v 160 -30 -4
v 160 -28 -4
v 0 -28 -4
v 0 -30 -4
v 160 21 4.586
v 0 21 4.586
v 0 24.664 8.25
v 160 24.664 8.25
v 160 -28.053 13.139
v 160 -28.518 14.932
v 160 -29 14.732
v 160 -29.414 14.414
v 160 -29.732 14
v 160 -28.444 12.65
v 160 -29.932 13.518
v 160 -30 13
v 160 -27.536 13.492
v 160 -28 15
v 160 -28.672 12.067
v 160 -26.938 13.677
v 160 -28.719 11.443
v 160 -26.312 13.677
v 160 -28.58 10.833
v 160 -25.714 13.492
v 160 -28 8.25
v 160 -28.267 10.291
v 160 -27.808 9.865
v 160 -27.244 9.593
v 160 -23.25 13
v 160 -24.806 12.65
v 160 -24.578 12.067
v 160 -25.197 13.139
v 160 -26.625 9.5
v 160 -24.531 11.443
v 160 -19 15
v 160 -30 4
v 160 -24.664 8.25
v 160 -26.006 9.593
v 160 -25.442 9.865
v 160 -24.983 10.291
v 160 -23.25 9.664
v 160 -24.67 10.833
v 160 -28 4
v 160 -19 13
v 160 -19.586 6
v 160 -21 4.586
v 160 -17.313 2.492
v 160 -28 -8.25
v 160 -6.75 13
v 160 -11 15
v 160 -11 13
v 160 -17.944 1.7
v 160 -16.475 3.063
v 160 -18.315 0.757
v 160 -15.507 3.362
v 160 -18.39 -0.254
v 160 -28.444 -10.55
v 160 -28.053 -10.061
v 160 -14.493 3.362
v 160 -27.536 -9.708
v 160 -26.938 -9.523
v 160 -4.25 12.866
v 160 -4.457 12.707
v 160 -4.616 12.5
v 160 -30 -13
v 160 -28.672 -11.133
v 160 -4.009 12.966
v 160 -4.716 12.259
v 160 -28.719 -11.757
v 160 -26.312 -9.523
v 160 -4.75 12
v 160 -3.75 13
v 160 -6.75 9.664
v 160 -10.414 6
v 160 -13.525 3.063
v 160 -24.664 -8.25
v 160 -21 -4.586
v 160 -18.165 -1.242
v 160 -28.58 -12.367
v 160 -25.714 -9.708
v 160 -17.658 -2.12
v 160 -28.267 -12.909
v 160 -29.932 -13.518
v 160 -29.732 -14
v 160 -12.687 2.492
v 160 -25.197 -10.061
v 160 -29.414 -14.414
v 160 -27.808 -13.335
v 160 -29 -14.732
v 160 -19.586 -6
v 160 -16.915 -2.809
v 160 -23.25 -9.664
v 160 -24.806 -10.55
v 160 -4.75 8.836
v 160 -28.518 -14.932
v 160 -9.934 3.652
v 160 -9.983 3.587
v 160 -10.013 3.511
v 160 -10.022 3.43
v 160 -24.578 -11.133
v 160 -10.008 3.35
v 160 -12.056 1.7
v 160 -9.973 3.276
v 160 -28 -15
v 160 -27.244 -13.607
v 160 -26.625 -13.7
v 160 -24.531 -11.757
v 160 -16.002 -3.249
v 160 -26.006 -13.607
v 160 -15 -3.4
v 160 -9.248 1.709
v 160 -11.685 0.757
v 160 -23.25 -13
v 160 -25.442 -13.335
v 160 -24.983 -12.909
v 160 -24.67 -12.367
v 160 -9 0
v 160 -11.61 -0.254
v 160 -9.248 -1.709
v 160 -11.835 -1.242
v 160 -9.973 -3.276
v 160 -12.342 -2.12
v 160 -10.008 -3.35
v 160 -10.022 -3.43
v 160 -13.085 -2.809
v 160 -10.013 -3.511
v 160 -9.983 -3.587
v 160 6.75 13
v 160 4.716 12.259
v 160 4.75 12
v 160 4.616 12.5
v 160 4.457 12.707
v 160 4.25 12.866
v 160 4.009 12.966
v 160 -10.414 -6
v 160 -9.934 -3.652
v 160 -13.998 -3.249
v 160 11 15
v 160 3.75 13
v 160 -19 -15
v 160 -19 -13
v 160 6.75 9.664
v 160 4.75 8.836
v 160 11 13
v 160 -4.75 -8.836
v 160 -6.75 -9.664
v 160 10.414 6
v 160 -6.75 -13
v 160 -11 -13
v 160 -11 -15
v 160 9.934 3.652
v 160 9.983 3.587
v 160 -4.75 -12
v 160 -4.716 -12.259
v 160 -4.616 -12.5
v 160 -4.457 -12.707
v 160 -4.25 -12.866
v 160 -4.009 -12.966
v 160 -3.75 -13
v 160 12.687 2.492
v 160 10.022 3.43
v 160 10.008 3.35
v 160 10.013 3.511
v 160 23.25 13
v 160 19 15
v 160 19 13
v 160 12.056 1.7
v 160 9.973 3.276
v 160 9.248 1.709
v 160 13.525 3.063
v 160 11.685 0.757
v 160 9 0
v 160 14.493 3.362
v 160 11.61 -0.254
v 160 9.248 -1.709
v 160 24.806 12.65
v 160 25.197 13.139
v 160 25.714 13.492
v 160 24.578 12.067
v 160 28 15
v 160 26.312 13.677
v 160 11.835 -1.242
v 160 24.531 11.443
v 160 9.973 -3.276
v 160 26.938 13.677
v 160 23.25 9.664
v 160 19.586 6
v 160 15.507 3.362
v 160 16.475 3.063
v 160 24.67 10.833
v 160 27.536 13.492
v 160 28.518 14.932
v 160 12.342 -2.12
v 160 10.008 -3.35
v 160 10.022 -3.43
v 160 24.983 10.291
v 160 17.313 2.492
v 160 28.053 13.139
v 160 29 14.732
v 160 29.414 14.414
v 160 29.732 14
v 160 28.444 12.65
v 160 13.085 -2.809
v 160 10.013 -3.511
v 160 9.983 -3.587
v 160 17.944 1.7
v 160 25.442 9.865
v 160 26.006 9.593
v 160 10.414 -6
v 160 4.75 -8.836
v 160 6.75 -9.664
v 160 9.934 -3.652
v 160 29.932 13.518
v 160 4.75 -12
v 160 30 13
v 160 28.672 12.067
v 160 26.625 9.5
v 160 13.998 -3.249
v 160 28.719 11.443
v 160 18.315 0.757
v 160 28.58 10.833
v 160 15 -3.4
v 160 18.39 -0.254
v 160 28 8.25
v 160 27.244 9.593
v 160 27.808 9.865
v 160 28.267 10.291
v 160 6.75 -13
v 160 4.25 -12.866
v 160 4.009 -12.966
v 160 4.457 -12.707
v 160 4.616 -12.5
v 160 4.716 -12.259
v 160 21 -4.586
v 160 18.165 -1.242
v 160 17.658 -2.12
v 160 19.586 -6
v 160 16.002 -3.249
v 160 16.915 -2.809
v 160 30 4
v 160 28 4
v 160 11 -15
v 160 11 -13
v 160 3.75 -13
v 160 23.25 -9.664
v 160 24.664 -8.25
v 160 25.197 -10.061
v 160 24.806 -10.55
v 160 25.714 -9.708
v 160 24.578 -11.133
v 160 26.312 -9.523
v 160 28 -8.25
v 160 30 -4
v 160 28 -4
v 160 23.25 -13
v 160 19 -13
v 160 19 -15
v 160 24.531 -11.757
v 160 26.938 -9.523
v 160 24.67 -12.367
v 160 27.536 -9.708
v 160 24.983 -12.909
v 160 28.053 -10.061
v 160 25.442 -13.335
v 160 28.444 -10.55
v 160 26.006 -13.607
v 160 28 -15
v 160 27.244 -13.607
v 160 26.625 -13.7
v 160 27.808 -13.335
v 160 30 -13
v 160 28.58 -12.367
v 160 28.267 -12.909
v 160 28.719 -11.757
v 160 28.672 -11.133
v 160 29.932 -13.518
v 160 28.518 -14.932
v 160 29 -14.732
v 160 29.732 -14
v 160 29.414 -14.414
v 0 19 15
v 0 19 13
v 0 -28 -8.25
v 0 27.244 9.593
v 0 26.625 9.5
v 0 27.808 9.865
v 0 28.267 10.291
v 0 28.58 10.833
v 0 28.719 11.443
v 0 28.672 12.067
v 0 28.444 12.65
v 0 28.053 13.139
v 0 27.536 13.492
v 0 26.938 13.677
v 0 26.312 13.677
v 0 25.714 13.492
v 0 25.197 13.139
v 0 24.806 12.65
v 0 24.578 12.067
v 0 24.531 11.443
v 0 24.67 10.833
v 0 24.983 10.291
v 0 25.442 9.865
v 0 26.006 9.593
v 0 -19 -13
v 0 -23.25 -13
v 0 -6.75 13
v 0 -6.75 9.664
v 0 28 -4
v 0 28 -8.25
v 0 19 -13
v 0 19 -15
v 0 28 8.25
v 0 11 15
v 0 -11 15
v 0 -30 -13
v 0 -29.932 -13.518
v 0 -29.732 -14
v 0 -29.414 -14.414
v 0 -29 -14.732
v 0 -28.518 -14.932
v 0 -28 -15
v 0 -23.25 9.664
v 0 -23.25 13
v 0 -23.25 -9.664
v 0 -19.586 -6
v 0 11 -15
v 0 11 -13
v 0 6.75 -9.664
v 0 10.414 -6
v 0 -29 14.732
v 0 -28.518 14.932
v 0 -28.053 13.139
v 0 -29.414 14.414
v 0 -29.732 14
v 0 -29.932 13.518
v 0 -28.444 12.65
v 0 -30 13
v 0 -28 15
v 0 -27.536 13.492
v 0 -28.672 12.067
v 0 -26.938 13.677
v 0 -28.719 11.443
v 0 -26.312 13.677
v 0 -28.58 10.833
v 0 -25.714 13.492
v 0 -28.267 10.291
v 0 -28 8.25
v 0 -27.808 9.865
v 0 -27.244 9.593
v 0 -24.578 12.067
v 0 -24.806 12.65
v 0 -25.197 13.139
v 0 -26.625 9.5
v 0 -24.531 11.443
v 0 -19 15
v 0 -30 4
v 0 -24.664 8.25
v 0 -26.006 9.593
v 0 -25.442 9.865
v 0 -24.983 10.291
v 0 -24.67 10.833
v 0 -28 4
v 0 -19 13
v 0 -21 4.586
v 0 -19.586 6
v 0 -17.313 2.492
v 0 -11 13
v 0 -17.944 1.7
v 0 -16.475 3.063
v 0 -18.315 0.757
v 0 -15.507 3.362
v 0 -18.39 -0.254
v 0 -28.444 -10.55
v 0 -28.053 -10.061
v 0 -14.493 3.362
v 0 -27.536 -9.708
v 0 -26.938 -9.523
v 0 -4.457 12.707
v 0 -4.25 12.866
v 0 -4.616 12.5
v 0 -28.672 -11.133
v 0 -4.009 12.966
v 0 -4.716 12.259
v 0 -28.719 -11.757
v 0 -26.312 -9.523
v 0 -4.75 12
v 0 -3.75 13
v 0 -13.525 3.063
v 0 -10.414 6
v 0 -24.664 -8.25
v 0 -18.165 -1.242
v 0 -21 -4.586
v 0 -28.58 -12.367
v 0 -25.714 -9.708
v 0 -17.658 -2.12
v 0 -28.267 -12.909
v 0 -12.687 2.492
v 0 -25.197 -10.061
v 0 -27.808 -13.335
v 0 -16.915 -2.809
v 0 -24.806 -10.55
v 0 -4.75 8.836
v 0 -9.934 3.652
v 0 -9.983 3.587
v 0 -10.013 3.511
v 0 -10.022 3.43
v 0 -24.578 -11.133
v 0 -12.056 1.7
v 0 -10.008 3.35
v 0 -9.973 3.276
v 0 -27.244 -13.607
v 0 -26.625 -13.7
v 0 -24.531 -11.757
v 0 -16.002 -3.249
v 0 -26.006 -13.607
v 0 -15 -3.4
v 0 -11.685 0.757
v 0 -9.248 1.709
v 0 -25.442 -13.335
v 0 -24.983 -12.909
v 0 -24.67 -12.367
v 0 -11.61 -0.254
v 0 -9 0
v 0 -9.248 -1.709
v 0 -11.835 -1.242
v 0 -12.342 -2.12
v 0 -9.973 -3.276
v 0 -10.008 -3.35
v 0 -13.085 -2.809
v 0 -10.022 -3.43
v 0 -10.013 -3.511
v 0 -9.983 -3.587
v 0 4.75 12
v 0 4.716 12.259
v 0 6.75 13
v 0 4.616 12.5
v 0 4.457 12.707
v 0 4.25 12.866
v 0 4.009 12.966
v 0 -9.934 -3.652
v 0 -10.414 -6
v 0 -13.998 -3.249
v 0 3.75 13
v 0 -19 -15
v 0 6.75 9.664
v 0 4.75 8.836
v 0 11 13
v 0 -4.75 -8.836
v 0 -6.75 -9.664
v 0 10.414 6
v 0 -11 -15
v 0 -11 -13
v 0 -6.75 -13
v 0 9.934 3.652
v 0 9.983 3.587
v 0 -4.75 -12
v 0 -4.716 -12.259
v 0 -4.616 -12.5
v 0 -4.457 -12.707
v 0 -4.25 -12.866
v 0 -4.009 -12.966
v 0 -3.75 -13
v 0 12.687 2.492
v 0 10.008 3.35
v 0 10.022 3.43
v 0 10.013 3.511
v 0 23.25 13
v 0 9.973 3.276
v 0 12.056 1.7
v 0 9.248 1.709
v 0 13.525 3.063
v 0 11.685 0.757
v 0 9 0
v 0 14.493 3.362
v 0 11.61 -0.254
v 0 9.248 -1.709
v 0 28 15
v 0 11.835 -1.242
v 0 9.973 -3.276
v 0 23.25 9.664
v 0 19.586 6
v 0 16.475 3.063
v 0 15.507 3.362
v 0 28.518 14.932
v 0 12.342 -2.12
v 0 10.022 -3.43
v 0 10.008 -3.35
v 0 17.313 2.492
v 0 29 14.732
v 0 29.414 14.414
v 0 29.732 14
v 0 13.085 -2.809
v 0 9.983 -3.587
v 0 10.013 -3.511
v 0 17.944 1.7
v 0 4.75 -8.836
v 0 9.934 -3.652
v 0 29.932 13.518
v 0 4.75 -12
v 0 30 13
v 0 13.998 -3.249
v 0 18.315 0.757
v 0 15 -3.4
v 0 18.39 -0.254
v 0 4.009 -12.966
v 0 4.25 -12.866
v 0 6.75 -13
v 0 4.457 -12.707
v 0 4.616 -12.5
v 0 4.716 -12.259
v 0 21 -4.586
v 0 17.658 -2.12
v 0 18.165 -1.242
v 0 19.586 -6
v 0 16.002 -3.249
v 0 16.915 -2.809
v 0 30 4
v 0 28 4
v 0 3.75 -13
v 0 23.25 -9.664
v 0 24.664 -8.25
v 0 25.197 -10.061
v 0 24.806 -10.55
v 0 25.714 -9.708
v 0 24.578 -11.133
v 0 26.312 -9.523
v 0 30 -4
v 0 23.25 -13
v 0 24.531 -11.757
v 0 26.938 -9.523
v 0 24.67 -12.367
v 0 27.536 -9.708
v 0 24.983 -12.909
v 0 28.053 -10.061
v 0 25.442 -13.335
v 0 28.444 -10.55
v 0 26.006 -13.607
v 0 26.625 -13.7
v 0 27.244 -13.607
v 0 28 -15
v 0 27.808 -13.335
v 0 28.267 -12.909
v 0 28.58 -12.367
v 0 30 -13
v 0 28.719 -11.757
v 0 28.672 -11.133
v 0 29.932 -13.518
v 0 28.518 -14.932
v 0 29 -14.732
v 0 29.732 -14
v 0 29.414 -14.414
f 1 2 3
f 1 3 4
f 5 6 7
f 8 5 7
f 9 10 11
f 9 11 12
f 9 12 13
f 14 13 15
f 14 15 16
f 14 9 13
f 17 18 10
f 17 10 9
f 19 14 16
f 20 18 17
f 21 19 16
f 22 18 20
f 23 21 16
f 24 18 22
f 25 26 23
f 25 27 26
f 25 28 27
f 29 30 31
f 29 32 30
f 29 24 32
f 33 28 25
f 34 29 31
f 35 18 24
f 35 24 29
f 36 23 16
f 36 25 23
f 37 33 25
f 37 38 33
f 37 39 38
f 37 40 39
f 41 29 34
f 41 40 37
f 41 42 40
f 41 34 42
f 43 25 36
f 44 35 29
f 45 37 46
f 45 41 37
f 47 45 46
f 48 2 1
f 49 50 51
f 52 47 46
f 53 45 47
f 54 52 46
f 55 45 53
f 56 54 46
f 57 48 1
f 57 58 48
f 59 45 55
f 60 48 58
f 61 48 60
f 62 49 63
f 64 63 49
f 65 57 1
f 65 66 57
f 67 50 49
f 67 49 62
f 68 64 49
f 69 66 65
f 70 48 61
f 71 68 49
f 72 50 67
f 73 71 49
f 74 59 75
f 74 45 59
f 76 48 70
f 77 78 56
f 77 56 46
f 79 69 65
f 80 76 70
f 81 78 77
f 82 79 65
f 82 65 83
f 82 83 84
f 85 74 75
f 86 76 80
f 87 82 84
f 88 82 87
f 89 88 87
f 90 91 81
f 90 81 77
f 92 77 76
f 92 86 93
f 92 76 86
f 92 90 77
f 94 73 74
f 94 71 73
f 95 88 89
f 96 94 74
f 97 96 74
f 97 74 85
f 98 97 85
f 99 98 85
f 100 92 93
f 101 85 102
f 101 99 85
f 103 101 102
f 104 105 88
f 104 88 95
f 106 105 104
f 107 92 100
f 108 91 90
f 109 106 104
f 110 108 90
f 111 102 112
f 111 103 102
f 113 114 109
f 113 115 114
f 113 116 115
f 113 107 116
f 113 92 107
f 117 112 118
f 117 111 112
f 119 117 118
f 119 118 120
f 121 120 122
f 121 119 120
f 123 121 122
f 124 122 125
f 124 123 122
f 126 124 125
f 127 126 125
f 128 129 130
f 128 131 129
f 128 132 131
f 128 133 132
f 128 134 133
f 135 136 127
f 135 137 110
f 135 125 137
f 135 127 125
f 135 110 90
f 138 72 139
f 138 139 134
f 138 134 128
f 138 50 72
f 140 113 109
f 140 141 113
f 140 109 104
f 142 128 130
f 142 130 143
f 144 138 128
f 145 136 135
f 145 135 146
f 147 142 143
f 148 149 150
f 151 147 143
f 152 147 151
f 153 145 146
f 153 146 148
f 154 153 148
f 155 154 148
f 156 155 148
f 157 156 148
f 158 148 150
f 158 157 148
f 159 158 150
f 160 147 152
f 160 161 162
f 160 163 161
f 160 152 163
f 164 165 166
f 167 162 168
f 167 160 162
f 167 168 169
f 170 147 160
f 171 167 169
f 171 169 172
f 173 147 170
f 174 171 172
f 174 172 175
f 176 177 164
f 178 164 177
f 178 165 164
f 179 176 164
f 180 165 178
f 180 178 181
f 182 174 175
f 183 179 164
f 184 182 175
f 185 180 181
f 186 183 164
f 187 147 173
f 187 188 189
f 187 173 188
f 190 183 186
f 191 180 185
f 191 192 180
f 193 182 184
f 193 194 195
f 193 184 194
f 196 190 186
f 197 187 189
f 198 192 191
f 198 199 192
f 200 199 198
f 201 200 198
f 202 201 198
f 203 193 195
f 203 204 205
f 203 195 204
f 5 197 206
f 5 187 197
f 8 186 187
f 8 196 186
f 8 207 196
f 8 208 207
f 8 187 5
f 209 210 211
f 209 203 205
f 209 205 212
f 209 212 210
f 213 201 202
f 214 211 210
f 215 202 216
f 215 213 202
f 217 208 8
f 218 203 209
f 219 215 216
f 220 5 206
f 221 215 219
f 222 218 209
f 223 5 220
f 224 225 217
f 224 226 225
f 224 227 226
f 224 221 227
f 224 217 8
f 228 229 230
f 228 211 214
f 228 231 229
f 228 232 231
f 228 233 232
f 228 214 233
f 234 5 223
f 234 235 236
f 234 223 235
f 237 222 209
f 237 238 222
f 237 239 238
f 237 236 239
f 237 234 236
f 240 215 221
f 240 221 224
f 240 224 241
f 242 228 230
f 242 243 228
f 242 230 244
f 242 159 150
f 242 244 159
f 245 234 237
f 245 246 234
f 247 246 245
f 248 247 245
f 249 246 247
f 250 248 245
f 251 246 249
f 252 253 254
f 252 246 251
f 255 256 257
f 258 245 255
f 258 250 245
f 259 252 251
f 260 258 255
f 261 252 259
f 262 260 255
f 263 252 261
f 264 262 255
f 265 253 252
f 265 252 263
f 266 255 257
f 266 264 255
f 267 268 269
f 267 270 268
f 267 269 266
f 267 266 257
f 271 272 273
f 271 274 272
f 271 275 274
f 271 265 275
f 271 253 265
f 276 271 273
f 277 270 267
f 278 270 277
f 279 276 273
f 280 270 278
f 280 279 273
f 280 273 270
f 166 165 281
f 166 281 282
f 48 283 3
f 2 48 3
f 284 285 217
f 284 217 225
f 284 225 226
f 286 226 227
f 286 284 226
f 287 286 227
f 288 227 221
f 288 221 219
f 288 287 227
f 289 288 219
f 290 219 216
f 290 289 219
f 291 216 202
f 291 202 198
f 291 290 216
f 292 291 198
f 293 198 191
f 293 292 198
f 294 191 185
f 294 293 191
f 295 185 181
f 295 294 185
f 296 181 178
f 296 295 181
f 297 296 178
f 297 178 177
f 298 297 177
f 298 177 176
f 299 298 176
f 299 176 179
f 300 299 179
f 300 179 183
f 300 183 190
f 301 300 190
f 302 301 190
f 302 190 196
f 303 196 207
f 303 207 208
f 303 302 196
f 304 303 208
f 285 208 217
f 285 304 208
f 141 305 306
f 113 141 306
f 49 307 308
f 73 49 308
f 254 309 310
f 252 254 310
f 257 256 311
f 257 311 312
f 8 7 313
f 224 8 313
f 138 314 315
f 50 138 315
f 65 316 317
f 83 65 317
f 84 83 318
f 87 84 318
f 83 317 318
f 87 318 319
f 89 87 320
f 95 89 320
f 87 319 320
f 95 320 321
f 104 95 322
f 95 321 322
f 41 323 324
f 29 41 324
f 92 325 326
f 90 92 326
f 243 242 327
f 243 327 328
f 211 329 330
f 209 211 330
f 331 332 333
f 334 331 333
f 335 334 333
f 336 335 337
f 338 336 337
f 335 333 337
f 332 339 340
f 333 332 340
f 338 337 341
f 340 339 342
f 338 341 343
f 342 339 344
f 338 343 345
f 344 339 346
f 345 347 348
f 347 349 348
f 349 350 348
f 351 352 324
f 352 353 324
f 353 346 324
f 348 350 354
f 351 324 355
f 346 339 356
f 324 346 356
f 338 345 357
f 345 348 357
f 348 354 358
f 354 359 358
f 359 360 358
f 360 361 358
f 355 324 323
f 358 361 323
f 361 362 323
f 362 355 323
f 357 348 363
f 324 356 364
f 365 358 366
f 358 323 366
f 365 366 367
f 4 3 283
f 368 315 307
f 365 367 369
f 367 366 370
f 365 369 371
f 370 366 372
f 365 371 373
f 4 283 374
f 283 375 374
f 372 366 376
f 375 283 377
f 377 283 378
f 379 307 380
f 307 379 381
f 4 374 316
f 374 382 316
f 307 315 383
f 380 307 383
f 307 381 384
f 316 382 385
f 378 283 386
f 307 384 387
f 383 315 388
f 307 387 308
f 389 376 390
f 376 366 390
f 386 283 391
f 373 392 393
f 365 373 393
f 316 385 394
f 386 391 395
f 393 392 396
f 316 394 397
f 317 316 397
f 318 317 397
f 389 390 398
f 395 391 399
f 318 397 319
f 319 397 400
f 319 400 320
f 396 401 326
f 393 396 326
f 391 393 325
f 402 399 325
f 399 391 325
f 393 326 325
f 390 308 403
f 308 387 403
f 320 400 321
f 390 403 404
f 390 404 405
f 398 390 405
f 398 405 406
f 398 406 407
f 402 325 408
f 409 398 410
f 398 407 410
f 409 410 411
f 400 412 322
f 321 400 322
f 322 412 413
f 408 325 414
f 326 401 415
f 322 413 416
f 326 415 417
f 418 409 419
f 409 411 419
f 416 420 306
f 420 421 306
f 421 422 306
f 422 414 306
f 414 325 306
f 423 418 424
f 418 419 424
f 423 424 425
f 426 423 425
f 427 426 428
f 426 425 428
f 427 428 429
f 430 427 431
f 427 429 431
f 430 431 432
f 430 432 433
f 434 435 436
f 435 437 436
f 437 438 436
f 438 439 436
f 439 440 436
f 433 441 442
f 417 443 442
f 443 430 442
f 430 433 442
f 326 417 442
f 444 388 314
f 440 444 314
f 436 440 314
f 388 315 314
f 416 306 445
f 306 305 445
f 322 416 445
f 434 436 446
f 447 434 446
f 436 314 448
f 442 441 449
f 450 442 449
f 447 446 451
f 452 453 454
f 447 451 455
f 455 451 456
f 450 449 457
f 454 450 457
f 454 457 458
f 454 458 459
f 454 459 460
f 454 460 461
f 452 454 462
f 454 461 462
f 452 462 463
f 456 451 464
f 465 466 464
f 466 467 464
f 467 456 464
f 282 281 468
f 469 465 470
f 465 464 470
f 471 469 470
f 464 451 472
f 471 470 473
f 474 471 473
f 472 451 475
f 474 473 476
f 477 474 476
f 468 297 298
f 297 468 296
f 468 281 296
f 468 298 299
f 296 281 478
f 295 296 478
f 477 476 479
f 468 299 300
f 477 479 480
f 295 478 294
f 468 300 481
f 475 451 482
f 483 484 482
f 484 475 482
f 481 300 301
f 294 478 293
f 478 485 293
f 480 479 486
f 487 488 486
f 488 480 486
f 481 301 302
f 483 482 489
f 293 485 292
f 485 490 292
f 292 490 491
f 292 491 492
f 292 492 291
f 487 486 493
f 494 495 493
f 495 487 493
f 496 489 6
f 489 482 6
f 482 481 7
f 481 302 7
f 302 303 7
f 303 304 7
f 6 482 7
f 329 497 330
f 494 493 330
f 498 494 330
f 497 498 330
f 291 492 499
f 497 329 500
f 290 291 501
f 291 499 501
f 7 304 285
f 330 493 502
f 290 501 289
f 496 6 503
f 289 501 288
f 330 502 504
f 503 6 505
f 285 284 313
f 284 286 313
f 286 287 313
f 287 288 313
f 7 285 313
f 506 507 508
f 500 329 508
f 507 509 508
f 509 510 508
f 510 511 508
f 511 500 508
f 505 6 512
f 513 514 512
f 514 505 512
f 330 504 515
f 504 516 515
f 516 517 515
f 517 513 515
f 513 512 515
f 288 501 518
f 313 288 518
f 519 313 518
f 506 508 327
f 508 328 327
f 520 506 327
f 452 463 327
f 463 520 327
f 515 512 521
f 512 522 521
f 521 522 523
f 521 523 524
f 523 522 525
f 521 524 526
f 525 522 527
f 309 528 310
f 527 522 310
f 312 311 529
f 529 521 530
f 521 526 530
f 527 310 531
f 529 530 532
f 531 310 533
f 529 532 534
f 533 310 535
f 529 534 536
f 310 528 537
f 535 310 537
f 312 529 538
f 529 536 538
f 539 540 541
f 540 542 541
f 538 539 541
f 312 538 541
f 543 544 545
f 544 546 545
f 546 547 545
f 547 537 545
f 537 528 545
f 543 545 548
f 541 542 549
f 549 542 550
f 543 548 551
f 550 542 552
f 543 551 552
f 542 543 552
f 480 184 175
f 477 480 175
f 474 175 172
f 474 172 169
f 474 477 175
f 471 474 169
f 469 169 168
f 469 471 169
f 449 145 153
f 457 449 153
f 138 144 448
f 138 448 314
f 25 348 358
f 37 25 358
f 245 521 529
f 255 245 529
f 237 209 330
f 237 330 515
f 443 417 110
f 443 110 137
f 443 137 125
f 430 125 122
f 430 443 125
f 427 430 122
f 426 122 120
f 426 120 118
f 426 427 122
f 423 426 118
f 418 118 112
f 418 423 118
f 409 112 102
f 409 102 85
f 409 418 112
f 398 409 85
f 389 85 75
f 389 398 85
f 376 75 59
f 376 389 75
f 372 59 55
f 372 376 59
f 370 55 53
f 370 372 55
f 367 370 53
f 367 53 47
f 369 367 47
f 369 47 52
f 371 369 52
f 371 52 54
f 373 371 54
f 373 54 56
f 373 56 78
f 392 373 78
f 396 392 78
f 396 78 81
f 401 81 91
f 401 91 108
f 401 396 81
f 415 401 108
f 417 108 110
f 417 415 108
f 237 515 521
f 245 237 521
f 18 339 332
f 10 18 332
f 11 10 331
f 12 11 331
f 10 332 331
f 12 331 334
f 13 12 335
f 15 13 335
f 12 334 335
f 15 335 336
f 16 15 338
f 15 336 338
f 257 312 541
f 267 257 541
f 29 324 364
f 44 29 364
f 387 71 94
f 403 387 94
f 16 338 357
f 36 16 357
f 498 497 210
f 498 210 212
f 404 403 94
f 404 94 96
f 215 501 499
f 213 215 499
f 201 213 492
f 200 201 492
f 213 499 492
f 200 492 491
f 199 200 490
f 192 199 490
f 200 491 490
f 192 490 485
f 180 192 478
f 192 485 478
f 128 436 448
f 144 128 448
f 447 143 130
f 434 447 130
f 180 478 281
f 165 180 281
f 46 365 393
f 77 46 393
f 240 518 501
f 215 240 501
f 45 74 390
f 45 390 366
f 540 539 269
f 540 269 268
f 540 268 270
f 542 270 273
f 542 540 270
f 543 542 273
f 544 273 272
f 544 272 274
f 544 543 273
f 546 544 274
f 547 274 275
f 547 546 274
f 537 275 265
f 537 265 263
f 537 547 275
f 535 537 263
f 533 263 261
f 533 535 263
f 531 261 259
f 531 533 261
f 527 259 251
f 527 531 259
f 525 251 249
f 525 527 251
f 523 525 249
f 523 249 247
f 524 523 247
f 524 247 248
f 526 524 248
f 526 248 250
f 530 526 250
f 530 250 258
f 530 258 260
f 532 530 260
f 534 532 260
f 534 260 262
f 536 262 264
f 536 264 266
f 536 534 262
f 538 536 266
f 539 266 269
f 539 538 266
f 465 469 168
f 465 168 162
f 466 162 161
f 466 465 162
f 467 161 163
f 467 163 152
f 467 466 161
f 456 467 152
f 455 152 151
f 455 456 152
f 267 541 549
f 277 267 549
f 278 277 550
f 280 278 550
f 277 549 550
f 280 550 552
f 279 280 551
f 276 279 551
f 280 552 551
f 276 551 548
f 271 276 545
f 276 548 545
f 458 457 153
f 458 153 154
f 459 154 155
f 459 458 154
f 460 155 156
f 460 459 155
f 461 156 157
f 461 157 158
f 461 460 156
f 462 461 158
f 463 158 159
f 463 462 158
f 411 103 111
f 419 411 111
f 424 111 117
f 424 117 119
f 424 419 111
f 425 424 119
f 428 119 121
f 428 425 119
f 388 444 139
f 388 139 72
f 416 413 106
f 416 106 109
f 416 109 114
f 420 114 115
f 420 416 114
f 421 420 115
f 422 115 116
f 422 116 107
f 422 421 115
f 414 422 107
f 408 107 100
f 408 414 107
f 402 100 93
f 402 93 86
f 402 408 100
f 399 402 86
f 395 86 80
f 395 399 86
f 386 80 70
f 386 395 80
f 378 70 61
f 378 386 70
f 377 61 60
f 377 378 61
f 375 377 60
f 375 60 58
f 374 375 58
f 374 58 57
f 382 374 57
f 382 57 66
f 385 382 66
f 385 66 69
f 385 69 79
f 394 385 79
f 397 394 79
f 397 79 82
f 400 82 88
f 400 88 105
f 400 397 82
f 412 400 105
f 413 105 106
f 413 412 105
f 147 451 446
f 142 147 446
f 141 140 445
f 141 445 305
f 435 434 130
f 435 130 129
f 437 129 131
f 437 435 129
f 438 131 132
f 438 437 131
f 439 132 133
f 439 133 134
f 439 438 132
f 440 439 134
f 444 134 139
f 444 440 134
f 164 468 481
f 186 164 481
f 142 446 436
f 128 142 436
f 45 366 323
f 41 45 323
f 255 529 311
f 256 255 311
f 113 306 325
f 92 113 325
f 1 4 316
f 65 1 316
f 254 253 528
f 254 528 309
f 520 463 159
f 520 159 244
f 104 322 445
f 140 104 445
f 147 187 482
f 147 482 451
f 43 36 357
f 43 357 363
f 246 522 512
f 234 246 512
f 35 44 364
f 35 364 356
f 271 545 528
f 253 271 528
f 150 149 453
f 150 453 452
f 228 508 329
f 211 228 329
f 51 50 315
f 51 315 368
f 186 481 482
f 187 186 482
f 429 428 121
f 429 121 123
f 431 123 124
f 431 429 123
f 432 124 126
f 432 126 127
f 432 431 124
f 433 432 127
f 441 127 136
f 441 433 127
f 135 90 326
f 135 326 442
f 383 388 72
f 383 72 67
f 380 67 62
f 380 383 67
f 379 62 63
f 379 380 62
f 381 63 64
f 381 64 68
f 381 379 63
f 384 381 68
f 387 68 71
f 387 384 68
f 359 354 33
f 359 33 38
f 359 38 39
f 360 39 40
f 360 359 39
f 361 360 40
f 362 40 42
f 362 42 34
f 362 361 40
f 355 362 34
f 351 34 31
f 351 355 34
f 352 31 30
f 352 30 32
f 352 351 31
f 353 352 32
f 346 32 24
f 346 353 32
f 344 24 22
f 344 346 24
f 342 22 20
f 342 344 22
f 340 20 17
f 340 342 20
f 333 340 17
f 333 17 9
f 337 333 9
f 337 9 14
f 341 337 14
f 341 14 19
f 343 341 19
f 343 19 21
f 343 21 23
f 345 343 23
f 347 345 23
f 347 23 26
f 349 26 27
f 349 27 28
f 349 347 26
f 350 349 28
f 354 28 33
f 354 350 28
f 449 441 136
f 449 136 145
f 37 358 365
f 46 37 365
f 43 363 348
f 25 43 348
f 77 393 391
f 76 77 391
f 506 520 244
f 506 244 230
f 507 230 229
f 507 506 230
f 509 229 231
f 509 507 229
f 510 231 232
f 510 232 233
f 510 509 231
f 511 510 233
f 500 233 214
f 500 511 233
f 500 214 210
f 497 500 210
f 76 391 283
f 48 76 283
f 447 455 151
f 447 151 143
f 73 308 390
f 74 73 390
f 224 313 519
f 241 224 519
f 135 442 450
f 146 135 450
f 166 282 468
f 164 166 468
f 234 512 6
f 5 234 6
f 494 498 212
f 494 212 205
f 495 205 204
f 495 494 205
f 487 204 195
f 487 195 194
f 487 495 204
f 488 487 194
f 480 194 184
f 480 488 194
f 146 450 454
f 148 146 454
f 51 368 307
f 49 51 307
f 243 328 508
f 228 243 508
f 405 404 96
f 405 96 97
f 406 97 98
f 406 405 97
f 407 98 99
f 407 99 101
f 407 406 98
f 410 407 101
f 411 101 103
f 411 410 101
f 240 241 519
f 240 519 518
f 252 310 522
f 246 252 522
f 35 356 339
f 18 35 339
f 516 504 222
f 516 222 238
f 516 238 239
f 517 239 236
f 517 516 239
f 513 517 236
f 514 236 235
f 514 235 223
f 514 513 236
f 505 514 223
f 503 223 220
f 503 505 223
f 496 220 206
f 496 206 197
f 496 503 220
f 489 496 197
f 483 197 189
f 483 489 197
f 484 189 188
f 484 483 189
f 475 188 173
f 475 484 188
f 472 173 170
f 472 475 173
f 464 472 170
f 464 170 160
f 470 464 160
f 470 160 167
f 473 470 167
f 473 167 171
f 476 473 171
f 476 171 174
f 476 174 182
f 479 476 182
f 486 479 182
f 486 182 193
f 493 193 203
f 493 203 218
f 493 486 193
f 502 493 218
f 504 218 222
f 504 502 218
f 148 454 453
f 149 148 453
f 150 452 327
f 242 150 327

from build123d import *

# Parameters (mm, degrees)
SKETCH1_R           = 2.1
SKETCH1_R_2         = 3.4
BOSS_EXTRUDE1_DEPTH = 160


with BuildPart() as part:
    # Sketch1 → Boss-Extrude1 (new body)
    with BuildSketch(Plane(origin=(0, 0, 0), x_dir=(0, 0, -1), z_dir=(1, 0, 0))):
        with BuildLine():
            Line((-15, 28), (-15, 19))
            Line((-15, 19), (-13, 19))
            Line((-13, 19), (-13, 23.25))
            Line((-13, 23.25), (-9.664213562, 23.25))
            Line((-9.664213562, 23.25), (-6, 19.585786438))
            Line((-6, 19.585786438), (-6, 10.414213562))
            Line((-6, 10.414213562), (-9.664213562, 6.75))
            Line((-9.664213562, 6.75), (-13, 6.75))
            Line((-13, 6.75), (-13, 11))
            Line((-13, 11), (-15, 11))
            Line((-15, 11), (-15, -11))
            Line((-15, -11), (-13, -11))
            Line((-13, -11), (-13, -6.75))
            Line((-13, -6.75), (-9.664213562, -6.75))
            Line((-9.664213562, -6.75), (-6, -10.414213562))
            Line((-6, -10.414213562), (-6, -19.585786438))
            Line((-6, -19.585786438), (-9.664213562, -23.25))
            Line((-9.664213562, -23.25), (-13, -23.25))
            Line((-13, -23.25), (-13, -19))
            Line((-13, -19), (-15, -19))
            Line((-15, -19), (-15, -28))
            ThreePointArc((-15, -28), (-14.414213562, -29.414213562), (-13, -30))
            Line((-13, -30), (-4, -30))
            Line((-4, -30), (-4, -28))
            Line((-4, -28), (-8.25, -28))
            Line((-8.25, -28), (-8.25, -24.664213562))
            Line((-8.25, -24.664213562), (-4.585786438, -21))
            Line((-4.585786438, -21), (4.585786438, -21))
            Line((4.585786438, -21), (8.25, -24.664213562))
            Line((8.25, -24.664213562), (8.25, -28))
            Line((8.25, -28), (4, -28))
            Line((4, -28), (4, -30))
            Line((4, -30), (13, -30))
            ThreePointArc((13, -30), (14.414213562, -29.414213562), (15, -28))
            Line((15, -28), (15, -19))
            Line((15, -19), (13, -19))
            Line((13, -19), (13, -23.25))
            Line((13, -23.25), (9.664213562, -23.25))
            Line((9.664213562, -23.25), (6, -19.585786438))
            Line((6, -19.585786438), (6, -10.414213562))
            Line((6, -10.414213562), (9.664213562, -6.75))
            Line((9.664213562, -6.75), (13, -6.75))
            Line((13, -6.75), (13, -11))
            Line((13, -11), (15, -11))
            Line((15, -11), (15, 11))
            Line((15, 11), (13, 11))
            Line((13, 11), (13, 6.75))
            Line((13, 6.75), (9.664213562, 6.75))
            Line((9.664213562, 6.75), (6, 10.414213562))
            Line((6, 10.414213562), (6, 19.585786438))
            Line((6, 19.585786438), (9.664213562, 23.25))
            Line((9.664213562, 23.25), (13, 23.25))
            Line((13, 23.25), (13, 19))
            Line((13, 19), (15, 19))
            Line((15, 19), (15, 28))
            ThreePointArc((15, 28), (14.414213562, 29.414213562), (13, 30))
            Line((13, 30), (4, 30))
            Line((4, 30), (4, 28))
            Line((4, 28), (8.25, 28))
            Line((8.25, 28), (8.25, 24.664213562))
            Line((8.25, 24.664213562), (4.585786438, 21))
            Line((4.585786438, 21), (-4.585786438, 21))
            Line((-4.585786438, 21), (-8.25, 24.664213562))
            Line((-8.25, 24.664213562), (-8.25, 28))
            Line((-8.25, 28), (-4, 28))
            Line((-4, 28), (-4, 30))
            Line((-4, 30), (-13, 30))
            ThreePointArc((-13, 30), (-14.414213562, 29.414213562), (-15, 28))
        make_face()
        with Locations((-11.6, 26.625)):
            Circle(SKETCH1_R, mode=Mode.SUBTRACT)
        with Locations((0, 15)):
            Circle(SKETCH1_R_2, mode=Mode.SUBTRACT)
        with Locations((11.6, 26.625)):
            Circle(SKETCH1_R, mode=Mode.SUBTRACT)
        with Locations((0, -15)):
            Circle(SKETCH1_R_2, mode=Mode.SUBTRACT)
        with Locations((-11.6, -26.625)):
            Circle(SKETCH1_R, mode=Mode.SUBTRACT)
        with Locations((11.6, -26.625)):
            Circle(SKETCH1_R, mode=Mode.SUBTRACT)
        with BuildLine():
            Line((-8.835786438, 4.75), (-12, 4.75))
            ThreePointArc((-12, 4.75), (-12.707106781, 4.457106781), (-13, 3.75))
            Line((-13, 3.75), (-13, -3.75))
            ThreePointArc((-13, -3.75), (-12.707106781, -4.457106781), (-12, -4.75))
            Line((-12, -4.75), (-8.835786438, -4.75))
            Line((-8.835786438, -4.75), (-3.651792162, -9.933994275))
            ThreePointArc((-3.651792162, -9.933994275), (-3.470780401, -10.020243756), (-3.275866789, -9.973202134))
            ThreePointArc((-3.275866789, -9.973202134), (0, -9), (3.275866789, -9.973202134))
            ThreePointArc((3.275866789, -9.973202134), (3.470780401, -10.020243756), (3.651792162, -9.933994275))
            Line((3.651792162, -9.933994275), (8.835786438, -4.75))
            Line((8.835786438, -4.75), (12, -4.75))
            ThreePointArc((12, -4.75), (12.707106781, -4.457106781), (13, -3.75))
            Line((13, -3.75), (13, 3.75))
            ThreePointArc((13, 3.75), (12.707106781, 4.457106781), (12, 4.75))
            Line((12, 4.75), (8.835786438, 4.75))
            Line((8.835786438, 4.75), (3.651792162, 9.933994275))
            ThreePointArc((3.651792162, 9.933994275), (3.470780401, 10.020243756), (3.275866789, 9.973202134))
            ThreePointArc((3.275866789, 9.973202134), (0, 9), (-3.275866789, 9.973202134))
            ThreePointArc((-3.275866789, 9.973202134), (-3.470780401, 10.020243756), (-3.651792162, 9.933994275))
            Line((-3.651792162, 9.933994275), (-8.835786438, 4.75))
        make_face(mode=Mode.SUBTRACT)
    extrude(amount=BOSS_EXTRUDE1_DEPTH)


solid = part.part
